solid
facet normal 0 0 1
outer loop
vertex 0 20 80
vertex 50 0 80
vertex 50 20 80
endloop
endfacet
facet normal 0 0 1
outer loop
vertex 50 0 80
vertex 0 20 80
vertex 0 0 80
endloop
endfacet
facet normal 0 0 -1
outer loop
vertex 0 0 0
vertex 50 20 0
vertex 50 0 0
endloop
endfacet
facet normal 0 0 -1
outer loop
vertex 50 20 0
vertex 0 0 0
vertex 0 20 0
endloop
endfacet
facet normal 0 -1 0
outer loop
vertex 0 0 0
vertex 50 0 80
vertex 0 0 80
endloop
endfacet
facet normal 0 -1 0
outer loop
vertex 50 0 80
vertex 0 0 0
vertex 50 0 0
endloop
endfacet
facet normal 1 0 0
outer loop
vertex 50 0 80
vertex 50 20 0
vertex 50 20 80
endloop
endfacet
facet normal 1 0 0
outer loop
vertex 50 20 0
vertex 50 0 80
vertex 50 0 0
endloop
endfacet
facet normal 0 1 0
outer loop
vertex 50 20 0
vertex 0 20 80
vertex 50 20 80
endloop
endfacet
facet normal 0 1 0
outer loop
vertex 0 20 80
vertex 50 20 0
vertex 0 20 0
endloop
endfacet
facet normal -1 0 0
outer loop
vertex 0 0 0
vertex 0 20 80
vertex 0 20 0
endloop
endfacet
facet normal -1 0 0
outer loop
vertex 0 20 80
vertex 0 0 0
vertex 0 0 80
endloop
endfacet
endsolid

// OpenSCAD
x = 50;
y = 20;
z = 80;

testCube();

module testCube() 
{
    cube ([x,y,z]);
}

  
